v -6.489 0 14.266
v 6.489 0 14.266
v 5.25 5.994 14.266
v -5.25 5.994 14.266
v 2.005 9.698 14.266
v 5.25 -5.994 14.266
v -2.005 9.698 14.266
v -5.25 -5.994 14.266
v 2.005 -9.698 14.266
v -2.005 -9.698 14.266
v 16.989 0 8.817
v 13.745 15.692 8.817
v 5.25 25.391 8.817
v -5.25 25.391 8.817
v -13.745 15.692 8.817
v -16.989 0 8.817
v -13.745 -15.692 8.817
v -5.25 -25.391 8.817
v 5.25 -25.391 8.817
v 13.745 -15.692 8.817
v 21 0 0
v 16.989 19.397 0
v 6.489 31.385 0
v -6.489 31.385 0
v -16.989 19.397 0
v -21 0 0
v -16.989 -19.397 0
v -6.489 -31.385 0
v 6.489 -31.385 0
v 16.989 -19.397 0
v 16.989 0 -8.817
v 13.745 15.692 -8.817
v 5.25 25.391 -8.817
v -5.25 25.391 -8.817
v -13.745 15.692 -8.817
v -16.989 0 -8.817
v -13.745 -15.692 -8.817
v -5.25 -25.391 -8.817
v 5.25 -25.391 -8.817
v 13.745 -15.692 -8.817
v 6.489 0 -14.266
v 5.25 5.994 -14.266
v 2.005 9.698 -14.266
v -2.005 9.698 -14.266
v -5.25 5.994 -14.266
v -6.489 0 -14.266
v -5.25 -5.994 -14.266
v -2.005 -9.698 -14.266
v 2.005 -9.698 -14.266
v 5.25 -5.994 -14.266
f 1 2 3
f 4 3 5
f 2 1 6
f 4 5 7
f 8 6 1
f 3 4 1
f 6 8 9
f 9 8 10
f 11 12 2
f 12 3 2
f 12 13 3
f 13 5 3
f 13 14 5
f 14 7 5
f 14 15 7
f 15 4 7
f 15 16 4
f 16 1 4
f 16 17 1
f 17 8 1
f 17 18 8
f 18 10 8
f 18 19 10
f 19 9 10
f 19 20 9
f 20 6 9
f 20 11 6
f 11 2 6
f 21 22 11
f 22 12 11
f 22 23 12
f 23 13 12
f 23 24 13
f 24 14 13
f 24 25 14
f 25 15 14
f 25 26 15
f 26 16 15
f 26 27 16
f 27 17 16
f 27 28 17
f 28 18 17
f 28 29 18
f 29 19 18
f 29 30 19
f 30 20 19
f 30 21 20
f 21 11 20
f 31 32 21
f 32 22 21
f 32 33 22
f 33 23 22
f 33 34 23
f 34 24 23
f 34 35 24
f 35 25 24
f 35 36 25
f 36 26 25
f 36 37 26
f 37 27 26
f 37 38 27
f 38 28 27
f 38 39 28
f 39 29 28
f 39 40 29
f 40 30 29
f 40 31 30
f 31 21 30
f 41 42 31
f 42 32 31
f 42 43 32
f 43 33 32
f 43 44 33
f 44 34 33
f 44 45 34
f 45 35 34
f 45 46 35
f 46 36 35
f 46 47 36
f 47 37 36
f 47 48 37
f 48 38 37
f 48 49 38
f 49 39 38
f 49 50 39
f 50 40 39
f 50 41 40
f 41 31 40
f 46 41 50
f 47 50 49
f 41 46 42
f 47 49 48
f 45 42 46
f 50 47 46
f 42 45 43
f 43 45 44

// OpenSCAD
// Generated by SolidPython 1.0.1 on 2020-07-29 00:46:47


scale(v = [7, 11, 5]) {
	sphere(r = 3);
}
/***********************************************
*********      SolidPython code:      **********
************************************************
 
# import packages: SolidPython
from solid import *
from solid.utils import *
from itertools import chain, combinations, permutations


class Resize:

    def __init__(self, scad_file):
        self.scad_file = scad_file
        #self.scad_file = import_scad(scad_file)
        # cone/cylinder param:
        self.r1 = 0
        self.r2 = 0
        self.h = 0
        # rectangular prism param:
        self.w = 0
        self.l = 0
        # ellipse param:
        self.r = 0

    # import OpenScad code (file name corresponds to shape)


    # classify shape + parameters
    def assign(self, param1, param2, param3):
        if self.scad_file == 'cone.scad':
            self.r1 = param1
            self.r2 = param2
            self.h = param3
        elif self.scad_file == 'cylinder.scad':
            self.r1 = param1
            self.r2 = param2
            self.h = param3
        elif self.scad_file == 'rectangularPrism.scad':
            self.h = param1
            self.l = param2
            self.w = param3
        else:
            self.r = param1
            self.h = param2

    # resize parameters
    def iterate(self):
        x = range(3, 20, 2)
        i = 1
        if self.scad_file == 'cone.scad':
            tempList = list(permutations(x, 2))
            for temp in tempList:
                param1 = temp[0]
                param2 = temp[1]
                filepath = 'produced_scad_files/' + 'cone' + str(param1) + '_' + str(param2) + '_' + '.scad'
                scad_render_to_file(cylinder(h=param1, r1=param2, r2=0), filepath)

        elif self.scad_file == 'cylinder.scad':
            tempList = list(permutations(x, 3))
            for temp in tempList:
                param1 = temp[0]
                param2 = temp[1]
                filepath = 'produced_scad_files/' + 'cylinder' + str(param1) + '_' + str(param2) + '_' + '.scad'
                scad_render_to_file(cylinder(h=param1, r1=param2, r2=param2), filepath)

        elif self.scad_file == 'rectangularPrism.scad':
            tempList = list(permutations(x, 3))
            for temp in tempList:
                param1 = temp[0]
                param2 = temp[1]
                param3 = temp[2]
                filepath = 'produced_scad_files/' + 'rectangularPrism' + str(param1) + '_' + str(param2) + '_' + str(
                    param3) + '.scad'
                scad_render_to_file(cube(size=(param1, param2, param3)), filepath)

        elif self.scad_file == 'ellipse.scad':
            tempList = list(permutations(x, 4))
            for temp in tempList:
                param1 = temp[0]
                param2 = temp[1]
                param3 = temp[2]
                param4 = temp[3]
                filepath = 'produced_scad_files/' + 'ellipse' + str(param1) + '_' + str(param2) + '_' + str(param3) + '_' + str(param4) + '.scad'
                scad_render_to_file(scale([param1, param2, param3])(sphere(r=param4)), filepath)

    def render_to_scadfile(self):
        scad_render_to_file(scad, 'example.scad') 
 
************************************************/
